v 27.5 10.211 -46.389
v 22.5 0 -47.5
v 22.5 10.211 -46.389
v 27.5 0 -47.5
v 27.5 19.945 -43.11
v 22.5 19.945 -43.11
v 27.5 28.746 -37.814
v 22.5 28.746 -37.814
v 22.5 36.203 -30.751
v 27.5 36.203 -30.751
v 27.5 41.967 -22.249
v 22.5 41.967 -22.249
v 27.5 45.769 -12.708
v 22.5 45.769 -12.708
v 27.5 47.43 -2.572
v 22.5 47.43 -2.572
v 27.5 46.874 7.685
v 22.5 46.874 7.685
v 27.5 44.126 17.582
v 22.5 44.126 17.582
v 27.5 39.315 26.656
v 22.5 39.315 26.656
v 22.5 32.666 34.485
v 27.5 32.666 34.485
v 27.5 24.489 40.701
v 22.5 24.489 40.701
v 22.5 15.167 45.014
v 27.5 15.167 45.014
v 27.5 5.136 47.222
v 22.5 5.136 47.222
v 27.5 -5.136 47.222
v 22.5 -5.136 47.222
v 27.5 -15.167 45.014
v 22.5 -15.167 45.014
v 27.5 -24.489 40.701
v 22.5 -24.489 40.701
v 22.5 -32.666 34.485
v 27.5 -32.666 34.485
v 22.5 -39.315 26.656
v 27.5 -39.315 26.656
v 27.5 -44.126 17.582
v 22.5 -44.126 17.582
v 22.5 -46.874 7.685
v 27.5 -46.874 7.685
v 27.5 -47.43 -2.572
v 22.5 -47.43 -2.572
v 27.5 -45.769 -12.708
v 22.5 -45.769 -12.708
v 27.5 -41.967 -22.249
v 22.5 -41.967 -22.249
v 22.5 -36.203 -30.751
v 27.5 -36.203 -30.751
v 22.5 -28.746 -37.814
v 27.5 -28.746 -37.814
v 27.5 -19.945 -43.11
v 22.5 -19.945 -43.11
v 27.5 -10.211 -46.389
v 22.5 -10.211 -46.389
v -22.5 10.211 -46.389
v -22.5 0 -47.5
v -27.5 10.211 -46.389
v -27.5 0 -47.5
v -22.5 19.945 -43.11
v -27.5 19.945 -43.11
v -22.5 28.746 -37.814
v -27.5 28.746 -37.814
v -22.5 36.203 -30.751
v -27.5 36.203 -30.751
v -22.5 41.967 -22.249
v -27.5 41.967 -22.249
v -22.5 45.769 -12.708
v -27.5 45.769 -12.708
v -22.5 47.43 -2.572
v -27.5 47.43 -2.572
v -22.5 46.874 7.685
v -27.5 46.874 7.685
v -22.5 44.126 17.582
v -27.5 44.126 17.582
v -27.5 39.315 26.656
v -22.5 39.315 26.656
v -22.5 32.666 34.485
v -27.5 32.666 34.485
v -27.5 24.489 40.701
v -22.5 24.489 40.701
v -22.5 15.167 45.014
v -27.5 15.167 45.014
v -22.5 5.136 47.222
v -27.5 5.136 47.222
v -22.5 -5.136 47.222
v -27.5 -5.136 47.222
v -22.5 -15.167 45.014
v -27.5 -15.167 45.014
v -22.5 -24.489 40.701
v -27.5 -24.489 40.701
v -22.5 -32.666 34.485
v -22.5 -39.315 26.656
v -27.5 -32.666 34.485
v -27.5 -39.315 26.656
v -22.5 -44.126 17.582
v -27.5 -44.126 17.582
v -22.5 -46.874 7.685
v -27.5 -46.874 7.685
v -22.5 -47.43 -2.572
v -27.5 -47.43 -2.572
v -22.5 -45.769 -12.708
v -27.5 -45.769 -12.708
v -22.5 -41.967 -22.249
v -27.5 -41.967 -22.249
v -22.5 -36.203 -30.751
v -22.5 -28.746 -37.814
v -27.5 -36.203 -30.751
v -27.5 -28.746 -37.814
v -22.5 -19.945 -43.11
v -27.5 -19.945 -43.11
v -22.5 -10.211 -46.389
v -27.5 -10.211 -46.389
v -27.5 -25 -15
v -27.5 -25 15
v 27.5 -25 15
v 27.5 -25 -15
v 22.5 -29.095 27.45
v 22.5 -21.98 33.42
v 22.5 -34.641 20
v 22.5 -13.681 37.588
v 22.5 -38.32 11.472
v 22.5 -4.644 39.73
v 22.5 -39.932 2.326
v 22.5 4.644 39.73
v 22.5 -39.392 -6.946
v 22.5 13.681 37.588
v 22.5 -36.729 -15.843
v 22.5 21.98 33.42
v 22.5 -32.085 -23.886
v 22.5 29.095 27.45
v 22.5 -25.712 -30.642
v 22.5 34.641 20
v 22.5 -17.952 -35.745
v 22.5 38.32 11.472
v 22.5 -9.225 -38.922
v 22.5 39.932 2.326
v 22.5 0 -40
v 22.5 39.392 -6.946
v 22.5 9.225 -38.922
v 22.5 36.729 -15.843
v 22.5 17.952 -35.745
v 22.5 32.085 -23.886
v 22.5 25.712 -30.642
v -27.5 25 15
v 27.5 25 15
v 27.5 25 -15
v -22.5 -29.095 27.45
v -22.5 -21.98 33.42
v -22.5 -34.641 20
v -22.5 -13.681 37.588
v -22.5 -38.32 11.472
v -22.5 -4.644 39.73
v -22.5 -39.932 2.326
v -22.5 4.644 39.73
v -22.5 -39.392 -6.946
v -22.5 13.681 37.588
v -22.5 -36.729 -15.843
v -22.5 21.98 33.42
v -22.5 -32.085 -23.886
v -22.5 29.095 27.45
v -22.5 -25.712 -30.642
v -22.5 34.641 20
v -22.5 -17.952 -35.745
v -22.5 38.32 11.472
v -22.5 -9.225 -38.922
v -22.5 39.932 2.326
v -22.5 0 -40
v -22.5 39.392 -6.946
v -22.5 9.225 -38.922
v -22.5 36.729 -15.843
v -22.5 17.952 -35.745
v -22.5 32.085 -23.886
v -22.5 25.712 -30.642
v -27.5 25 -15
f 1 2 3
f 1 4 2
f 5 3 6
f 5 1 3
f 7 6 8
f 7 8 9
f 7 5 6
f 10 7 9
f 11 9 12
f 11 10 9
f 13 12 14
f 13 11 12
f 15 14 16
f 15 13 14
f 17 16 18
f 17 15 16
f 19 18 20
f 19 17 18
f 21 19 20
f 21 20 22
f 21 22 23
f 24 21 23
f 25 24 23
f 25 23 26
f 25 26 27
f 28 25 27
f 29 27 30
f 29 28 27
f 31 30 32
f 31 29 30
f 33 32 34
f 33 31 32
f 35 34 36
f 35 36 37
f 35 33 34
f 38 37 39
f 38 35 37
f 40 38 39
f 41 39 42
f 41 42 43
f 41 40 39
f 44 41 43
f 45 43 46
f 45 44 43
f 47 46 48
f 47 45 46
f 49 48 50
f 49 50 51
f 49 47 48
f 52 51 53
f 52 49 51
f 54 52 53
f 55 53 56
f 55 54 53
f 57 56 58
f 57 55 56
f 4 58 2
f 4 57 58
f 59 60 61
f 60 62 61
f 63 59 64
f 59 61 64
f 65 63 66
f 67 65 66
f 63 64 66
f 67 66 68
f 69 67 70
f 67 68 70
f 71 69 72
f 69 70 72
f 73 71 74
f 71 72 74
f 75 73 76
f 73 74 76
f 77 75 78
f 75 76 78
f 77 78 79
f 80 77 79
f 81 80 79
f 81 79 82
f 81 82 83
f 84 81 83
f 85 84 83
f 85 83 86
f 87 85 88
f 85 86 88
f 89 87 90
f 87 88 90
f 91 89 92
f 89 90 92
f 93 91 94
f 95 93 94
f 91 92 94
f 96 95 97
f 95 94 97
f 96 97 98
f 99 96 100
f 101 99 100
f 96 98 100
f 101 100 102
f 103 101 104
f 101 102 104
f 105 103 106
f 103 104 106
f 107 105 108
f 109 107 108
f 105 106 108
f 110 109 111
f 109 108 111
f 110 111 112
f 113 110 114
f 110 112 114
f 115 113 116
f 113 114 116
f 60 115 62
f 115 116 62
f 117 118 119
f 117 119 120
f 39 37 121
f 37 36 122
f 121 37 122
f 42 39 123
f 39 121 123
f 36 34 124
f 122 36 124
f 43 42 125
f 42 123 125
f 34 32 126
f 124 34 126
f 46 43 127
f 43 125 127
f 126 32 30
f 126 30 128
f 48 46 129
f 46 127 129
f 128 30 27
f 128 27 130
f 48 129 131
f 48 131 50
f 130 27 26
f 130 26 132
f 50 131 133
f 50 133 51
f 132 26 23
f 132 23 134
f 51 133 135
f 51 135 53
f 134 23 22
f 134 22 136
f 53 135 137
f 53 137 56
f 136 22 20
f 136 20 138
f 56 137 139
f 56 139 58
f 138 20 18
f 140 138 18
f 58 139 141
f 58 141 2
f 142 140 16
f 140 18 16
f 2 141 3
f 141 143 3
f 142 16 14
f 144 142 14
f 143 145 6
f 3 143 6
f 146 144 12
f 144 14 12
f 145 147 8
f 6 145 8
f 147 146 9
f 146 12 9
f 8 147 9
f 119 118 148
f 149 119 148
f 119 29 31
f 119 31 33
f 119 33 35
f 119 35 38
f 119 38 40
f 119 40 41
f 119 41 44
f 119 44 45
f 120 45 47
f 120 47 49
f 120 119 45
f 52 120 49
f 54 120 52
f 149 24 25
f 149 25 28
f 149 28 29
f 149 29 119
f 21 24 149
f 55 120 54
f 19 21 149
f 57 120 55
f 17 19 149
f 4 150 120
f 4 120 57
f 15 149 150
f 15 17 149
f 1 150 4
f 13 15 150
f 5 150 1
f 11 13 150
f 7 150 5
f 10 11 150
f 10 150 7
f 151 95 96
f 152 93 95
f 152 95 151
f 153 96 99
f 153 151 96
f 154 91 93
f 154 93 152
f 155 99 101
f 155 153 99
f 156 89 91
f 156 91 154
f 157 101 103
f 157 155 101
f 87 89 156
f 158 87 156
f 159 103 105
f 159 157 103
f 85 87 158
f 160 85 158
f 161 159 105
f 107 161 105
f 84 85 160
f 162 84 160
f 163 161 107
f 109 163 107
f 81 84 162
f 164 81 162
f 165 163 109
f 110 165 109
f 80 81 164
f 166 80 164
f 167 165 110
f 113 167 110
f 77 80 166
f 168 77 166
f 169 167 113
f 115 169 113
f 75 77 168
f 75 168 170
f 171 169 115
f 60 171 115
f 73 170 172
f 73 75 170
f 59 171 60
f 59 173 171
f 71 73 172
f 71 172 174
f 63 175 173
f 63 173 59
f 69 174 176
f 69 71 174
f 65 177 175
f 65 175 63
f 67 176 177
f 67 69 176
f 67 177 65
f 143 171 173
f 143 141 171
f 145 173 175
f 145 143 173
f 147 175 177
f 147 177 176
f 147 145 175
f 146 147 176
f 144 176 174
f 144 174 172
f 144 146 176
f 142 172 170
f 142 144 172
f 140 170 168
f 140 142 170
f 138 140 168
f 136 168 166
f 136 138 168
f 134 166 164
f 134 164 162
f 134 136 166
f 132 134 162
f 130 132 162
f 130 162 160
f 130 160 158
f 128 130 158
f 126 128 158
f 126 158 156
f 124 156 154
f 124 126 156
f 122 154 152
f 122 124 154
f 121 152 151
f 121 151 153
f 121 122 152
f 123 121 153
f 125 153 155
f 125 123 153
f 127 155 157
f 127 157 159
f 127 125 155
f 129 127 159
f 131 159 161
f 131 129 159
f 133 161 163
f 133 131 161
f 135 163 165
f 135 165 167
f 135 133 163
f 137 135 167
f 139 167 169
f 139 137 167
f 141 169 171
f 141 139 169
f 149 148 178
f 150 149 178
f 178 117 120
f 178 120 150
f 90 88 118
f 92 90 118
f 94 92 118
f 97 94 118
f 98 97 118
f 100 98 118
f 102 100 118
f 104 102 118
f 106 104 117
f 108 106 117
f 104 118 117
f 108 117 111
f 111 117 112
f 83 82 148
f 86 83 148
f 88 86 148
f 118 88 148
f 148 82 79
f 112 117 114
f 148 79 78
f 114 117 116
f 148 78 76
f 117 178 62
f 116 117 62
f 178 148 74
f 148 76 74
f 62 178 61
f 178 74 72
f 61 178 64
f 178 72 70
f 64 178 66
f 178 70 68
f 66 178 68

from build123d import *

# Parameters (mm, degrees)
SKETCH2_R               = 40
BOSS_EXTRUDE1_DEPTH     = 25
SKETCH3_R               = 47.5
BOSS_EXTRUDE2_DEPTH     = 2.5
CUT_EXTRUDE1_DEPTH      = 86.256964525
CUT_EXTRUDE1_DEPTH_BACK = 86.256964525
SKETCH4_W               = 30
SKETCH4_H               = 50


with BuildPart() as part:
    # Sketch2 → Boss-Extrude1 (new, symmetric)
    with BuildSketch(Plane(origin=(0, 0, 0), x_dir=(0, 0, -1), z_dir=(1, 0, 0))):
        Circle(SKETCH2_R)
    extrude(amount=BOSS_EXTRUDE1_DEPTH, both=True)

    # Sketch3 → Boss-Extrude2 (add, symmetric)
    with BuildSketch(Plane(origin=(25, 0, 0), x_dir=(0, 0, -1), z_dir=(1, 0, 0))):
        Circle(SKETCH3_R)
    boss_extrude2 = extrude(amount=BOSS_EXTRUDE2_DEPTH, both=True)

    # Mirror1: Boss-Extrude2 across plane
    add(boss_extrude2.mirror(Plane(origin=(0, 0, 0), x_dir=(0, 0, 1), z_dir=(1, 0, 0))))

    # Sketch4 → Cut-Extrude1 (cut, two sides: drawn at the far end of the back side and taken through both)
    with BuildSketch(Plane(origin=(25, 0, 0), x_dir=(0, 0, -1), z_dir=(1, 0, 0)).offset(-CUT_EXTRUDE1_DEPTH_BACK)):
        Rectangle(SKETCH4_W, SKETCH4_H)
    extrude(amount=CUT_EXTRUDE1_DEPTH + CUT_EXTRUDE1_DEPTH_BACK, mode=Mode.SUBTRACT)


solid = part.part
